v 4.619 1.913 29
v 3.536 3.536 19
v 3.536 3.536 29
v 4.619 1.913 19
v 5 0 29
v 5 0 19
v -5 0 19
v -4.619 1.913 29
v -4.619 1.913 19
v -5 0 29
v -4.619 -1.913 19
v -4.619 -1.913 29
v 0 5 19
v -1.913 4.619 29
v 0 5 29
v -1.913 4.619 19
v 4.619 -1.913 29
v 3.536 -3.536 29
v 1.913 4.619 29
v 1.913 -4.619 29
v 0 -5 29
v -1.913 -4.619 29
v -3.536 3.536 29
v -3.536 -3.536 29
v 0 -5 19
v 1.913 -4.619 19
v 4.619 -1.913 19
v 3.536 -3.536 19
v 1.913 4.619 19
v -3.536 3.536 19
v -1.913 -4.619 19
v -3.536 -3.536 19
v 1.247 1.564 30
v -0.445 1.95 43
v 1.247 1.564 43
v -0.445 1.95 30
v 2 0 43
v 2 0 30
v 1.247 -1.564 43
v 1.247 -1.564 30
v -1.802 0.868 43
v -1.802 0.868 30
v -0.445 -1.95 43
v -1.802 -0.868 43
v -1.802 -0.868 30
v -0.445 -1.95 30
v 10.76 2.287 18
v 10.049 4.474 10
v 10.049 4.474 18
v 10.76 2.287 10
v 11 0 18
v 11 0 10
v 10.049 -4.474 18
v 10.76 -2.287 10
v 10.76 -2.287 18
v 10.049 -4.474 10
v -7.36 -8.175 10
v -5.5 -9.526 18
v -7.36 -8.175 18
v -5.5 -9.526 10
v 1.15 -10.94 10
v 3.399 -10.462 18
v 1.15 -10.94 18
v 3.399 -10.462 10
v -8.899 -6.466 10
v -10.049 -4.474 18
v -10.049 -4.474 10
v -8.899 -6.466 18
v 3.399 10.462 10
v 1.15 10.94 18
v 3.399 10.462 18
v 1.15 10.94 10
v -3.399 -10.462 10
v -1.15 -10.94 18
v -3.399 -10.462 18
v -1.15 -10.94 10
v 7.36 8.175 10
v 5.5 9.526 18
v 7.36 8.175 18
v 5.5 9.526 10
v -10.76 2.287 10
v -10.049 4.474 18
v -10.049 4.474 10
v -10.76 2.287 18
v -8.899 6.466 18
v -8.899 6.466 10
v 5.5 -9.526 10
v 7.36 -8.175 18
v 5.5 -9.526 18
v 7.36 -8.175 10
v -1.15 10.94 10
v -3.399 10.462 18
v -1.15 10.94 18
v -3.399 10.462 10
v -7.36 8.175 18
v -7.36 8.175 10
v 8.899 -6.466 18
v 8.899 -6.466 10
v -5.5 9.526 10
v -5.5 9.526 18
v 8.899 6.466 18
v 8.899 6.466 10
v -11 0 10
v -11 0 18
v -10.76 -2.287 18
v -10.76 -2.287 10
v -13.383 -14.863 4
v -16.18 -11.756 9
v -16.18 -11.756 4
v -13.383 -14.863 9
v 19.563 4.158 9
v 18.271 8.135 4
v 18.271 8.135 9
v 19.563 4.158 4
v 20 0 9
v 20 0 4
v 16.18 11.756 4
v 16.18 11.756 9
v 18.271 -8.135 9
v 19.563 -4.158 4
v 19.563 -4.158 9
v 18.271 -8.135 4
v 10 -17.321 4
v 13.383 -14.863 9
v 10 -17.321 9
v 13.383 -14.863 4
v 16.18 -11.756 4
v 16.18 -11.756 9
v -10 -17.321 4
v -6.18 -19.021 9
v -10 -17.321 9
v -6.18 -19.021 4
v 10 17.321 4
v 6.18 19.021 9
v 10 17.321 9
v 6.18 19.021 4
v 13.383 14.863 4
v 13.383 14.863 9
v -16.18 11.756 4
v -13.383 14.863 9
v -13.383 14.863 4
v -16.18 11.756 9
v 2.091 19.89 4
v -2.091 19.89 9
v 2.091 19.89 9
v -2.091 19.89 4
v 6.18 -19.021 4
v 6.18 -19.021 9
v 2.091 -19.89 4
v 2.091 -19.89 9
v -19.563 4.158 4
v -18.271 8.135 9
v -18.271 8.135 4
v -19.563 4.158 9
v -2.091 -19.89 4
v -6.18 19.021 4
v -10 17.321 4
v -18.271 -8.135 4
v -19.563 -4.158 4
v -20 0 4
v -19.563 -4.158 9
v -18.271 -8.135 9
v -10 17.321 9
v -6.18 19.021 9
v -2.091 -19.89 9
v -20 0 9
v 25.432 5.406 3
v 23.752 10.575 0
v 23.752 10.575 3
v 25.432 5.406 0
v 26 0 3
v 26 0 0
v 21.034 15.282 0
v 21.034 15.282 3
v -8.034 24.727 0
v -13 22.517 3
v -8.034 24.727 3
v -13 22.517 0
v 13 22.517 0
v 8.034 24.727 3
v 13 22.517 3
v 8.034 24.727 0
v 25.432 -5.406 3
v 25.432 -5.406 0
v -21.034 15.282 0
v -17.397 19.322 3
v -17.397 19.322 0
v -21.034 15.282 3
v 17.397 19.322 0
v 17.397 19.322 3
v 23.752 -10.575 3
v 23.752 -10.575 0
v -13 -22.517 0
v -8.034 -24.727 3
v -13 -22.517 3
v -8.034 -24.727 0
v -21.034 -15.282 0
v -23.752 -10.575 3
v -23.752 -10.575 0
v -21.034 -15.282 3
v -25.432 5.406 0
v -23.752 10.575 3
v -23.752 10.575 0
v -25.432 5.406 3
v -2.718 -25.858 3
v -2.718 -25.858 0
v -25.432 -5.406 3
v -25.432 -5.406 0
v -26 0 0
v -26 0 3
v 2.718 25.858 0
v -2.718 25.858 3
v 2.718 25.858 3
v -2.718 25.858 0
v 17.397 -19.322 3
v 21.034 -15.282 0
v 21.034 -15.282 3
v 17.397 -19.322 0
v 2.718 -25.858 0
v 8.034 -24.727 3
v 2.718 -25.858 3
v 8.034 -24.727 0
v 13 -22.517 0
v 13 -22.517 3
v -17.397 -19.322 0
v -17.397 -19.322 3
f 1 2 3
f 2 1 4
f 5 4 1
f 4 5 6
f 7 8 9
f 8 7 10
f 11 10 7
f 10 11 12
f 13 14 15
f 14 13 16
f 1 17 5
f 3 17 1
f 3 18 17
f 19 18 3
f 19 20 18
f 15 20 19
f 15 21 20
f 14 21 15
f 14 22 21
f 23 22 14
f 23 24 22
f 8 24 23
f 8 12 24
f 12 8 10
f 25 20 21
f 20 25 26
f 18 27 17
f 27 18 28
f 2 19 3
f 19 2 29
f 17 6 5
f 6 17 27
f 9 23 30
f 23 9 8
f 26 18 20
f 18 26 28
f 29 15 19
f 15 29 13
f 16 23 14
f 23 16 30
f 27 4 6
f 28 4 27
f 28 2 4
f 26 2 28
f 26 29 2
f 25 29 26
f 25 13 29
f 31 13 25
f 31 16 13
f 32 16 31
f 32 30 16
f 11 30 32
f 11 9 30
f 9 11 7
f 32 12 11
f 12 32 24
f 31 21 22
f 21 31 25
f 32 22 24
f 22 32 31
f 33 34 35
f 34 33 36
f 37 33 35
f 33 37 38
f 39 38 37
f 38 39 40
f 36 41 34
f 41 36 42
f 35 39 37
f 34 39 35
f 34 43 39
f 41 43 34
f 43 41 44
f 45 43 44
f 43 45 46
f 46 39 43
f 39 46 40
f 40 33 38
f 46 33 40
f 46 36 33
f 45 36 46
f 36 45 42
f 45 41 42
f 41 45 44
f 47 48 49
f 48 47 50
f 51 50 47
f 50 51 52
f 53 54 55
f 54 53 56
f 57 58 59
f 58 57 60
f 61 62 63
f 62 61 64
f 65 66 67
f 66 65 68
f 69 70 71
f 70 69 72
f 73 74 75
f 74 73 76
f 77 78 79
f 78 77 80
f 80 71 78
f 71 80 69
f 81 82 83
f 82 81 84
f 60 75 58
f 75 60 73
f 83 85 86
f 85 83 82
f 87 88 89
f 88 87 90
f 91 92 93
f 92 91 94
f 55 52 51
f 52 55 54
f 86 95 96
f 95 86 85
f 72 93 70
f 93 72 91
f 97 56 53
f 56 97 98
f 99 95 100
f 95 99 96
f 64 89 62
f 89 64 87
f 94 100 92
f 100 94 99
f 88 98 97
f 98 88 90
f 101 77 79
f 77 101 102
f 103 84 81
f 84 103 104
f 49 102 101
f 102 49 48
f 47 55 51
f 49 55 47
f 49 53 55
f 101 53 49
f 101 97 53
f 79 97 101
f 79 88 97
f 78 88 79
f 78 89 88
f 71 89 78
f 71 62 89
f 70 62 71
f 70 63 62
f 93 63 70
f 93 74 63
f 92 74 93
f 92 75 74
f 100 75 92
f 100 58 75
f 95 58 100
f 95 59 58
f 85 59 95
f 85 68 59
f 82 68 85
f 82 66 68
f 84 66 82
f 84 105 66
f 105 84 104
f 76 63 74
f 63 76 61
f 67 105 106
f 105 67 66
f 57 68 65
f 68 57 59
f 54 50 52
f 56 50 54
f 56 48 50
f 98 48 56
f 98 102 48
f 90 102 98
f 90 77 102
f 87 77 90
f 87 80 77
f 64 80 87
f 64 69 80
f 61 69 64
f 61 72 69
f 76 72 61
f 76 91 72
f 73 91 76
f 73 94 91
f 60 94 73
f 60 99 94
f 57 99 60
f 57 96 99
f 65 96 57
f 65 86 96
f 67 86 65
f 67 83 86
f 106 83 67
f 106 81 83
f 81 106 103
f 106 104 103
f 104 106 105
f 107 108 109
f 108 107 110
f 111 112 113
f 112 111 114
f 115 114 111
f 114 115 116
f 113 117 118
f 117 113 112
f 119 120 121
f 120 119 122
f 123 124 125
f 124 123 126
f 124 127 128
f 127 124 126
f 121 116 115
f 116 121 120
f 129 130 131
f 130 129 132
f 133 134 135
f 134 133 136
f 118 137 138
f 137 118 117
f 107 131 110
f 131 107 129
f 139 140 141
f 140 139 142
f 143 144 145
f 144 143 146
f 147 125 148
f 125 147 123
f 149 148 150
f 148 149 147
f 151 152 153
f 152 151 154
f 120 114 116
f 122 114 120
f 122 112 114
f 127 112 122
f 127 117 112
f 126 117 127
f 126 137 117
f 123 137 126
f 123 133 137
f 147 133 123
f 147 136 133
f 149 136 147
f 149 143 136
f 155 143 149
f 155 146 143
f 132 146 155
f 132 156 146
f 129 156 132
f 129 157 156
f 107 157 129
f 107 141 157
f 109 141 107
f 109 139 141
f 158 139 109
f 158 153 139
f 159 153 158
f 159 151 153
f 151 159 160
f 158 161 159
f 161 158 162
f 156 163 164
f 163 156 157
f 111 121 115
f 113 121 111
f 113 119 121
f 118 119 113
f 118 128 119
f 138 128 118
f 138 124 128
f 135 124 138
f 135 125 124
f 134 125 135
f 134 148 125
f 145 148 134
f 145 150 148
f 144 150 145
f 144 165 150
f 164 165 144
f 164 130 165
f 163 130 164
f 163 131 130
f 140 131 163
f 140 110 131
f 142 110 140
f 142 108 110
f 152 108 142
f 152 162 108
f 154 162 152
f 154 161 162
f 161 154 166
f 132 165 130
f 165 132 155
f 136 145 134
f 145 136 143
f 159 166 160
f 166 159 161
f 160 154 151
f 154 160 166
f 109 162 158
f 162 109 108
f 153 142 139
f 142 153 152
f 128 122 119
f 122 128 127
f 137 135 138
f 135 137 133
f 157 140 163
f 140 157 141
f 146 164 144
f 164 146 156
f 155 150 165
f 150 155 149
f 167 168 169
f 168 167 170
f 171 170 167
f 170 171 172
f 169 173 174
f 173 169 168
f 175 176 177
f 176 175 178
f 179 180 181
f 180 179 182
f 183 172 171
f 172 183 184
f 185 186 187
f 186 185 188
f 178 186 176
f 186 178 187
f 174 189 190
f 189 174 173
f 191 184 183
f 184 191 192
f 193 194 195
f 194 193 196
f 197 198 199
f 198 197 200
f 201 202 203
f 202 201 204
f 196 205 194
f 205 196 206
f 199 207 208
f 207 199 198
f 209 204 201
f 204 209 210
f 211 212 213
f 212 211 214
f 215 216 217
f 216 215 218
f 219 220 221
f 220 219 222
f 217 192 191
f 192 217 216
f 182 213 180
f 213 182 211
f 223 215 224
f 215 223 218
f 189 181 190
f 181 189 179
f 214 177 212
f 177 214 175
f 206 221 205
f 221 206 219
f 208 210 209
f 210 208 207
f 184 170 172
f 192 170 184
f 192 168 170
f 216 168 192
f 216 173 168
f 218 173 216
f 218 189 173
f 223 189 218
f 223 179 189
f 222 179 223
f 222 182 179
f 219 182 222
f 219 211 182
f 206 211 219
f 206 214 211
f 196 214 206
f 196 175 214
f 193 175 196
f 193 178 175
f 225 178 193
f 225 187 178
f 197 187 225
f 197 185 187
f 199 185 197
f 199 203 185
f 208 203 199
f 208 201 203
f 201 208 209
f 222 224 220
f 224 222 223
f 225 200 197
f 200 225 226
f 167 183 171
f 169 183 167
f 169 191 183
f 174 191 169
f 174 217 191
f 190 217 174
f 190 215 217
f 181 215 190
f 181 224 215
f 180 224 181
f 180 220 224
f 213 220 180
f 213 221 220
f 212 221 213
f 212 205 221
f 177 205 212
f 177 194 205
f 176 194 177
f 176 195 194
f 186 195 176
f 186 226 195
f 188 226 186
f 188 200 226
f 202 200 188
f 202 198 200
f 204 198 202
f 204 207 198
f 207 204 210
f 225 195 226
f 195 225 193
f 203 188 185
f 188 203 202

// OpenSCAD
// Define the sizes for the cylinders, first value is the
// radius, the second is the height.
// All cylinders are to be stacked above each other (with
// an additional spacing of 1 unit).
sizes = [ [ 26, 3 ], [ 20, 5 ], [ 11, 8 ],  [ 5, 10 ], [ 2, 13 ] ];

// One option to solve this is by using a recursive module
// that creates a new translated coordinate system before
// going into the next level.
module translated_cylinder(size_vector, idx = 0) {
    if (idx < len(size_vector)) {
        radius = size_vector[idx][0];
        height = size_vector[idx][1];

        // Create the cylinder for the current level.
        cylinder(r = radius, h = height);

        // Recursive call generating the next cylinders
        // translated in Z direction based on the height
        // of the current cylinder
        translate([0, 0, height + 1]) {
            translated_cylinder(size_vector, idx + 1);
        }
    }
}

// Call the module to create the stacked cylinders.
translated_cylinder(sizes);
